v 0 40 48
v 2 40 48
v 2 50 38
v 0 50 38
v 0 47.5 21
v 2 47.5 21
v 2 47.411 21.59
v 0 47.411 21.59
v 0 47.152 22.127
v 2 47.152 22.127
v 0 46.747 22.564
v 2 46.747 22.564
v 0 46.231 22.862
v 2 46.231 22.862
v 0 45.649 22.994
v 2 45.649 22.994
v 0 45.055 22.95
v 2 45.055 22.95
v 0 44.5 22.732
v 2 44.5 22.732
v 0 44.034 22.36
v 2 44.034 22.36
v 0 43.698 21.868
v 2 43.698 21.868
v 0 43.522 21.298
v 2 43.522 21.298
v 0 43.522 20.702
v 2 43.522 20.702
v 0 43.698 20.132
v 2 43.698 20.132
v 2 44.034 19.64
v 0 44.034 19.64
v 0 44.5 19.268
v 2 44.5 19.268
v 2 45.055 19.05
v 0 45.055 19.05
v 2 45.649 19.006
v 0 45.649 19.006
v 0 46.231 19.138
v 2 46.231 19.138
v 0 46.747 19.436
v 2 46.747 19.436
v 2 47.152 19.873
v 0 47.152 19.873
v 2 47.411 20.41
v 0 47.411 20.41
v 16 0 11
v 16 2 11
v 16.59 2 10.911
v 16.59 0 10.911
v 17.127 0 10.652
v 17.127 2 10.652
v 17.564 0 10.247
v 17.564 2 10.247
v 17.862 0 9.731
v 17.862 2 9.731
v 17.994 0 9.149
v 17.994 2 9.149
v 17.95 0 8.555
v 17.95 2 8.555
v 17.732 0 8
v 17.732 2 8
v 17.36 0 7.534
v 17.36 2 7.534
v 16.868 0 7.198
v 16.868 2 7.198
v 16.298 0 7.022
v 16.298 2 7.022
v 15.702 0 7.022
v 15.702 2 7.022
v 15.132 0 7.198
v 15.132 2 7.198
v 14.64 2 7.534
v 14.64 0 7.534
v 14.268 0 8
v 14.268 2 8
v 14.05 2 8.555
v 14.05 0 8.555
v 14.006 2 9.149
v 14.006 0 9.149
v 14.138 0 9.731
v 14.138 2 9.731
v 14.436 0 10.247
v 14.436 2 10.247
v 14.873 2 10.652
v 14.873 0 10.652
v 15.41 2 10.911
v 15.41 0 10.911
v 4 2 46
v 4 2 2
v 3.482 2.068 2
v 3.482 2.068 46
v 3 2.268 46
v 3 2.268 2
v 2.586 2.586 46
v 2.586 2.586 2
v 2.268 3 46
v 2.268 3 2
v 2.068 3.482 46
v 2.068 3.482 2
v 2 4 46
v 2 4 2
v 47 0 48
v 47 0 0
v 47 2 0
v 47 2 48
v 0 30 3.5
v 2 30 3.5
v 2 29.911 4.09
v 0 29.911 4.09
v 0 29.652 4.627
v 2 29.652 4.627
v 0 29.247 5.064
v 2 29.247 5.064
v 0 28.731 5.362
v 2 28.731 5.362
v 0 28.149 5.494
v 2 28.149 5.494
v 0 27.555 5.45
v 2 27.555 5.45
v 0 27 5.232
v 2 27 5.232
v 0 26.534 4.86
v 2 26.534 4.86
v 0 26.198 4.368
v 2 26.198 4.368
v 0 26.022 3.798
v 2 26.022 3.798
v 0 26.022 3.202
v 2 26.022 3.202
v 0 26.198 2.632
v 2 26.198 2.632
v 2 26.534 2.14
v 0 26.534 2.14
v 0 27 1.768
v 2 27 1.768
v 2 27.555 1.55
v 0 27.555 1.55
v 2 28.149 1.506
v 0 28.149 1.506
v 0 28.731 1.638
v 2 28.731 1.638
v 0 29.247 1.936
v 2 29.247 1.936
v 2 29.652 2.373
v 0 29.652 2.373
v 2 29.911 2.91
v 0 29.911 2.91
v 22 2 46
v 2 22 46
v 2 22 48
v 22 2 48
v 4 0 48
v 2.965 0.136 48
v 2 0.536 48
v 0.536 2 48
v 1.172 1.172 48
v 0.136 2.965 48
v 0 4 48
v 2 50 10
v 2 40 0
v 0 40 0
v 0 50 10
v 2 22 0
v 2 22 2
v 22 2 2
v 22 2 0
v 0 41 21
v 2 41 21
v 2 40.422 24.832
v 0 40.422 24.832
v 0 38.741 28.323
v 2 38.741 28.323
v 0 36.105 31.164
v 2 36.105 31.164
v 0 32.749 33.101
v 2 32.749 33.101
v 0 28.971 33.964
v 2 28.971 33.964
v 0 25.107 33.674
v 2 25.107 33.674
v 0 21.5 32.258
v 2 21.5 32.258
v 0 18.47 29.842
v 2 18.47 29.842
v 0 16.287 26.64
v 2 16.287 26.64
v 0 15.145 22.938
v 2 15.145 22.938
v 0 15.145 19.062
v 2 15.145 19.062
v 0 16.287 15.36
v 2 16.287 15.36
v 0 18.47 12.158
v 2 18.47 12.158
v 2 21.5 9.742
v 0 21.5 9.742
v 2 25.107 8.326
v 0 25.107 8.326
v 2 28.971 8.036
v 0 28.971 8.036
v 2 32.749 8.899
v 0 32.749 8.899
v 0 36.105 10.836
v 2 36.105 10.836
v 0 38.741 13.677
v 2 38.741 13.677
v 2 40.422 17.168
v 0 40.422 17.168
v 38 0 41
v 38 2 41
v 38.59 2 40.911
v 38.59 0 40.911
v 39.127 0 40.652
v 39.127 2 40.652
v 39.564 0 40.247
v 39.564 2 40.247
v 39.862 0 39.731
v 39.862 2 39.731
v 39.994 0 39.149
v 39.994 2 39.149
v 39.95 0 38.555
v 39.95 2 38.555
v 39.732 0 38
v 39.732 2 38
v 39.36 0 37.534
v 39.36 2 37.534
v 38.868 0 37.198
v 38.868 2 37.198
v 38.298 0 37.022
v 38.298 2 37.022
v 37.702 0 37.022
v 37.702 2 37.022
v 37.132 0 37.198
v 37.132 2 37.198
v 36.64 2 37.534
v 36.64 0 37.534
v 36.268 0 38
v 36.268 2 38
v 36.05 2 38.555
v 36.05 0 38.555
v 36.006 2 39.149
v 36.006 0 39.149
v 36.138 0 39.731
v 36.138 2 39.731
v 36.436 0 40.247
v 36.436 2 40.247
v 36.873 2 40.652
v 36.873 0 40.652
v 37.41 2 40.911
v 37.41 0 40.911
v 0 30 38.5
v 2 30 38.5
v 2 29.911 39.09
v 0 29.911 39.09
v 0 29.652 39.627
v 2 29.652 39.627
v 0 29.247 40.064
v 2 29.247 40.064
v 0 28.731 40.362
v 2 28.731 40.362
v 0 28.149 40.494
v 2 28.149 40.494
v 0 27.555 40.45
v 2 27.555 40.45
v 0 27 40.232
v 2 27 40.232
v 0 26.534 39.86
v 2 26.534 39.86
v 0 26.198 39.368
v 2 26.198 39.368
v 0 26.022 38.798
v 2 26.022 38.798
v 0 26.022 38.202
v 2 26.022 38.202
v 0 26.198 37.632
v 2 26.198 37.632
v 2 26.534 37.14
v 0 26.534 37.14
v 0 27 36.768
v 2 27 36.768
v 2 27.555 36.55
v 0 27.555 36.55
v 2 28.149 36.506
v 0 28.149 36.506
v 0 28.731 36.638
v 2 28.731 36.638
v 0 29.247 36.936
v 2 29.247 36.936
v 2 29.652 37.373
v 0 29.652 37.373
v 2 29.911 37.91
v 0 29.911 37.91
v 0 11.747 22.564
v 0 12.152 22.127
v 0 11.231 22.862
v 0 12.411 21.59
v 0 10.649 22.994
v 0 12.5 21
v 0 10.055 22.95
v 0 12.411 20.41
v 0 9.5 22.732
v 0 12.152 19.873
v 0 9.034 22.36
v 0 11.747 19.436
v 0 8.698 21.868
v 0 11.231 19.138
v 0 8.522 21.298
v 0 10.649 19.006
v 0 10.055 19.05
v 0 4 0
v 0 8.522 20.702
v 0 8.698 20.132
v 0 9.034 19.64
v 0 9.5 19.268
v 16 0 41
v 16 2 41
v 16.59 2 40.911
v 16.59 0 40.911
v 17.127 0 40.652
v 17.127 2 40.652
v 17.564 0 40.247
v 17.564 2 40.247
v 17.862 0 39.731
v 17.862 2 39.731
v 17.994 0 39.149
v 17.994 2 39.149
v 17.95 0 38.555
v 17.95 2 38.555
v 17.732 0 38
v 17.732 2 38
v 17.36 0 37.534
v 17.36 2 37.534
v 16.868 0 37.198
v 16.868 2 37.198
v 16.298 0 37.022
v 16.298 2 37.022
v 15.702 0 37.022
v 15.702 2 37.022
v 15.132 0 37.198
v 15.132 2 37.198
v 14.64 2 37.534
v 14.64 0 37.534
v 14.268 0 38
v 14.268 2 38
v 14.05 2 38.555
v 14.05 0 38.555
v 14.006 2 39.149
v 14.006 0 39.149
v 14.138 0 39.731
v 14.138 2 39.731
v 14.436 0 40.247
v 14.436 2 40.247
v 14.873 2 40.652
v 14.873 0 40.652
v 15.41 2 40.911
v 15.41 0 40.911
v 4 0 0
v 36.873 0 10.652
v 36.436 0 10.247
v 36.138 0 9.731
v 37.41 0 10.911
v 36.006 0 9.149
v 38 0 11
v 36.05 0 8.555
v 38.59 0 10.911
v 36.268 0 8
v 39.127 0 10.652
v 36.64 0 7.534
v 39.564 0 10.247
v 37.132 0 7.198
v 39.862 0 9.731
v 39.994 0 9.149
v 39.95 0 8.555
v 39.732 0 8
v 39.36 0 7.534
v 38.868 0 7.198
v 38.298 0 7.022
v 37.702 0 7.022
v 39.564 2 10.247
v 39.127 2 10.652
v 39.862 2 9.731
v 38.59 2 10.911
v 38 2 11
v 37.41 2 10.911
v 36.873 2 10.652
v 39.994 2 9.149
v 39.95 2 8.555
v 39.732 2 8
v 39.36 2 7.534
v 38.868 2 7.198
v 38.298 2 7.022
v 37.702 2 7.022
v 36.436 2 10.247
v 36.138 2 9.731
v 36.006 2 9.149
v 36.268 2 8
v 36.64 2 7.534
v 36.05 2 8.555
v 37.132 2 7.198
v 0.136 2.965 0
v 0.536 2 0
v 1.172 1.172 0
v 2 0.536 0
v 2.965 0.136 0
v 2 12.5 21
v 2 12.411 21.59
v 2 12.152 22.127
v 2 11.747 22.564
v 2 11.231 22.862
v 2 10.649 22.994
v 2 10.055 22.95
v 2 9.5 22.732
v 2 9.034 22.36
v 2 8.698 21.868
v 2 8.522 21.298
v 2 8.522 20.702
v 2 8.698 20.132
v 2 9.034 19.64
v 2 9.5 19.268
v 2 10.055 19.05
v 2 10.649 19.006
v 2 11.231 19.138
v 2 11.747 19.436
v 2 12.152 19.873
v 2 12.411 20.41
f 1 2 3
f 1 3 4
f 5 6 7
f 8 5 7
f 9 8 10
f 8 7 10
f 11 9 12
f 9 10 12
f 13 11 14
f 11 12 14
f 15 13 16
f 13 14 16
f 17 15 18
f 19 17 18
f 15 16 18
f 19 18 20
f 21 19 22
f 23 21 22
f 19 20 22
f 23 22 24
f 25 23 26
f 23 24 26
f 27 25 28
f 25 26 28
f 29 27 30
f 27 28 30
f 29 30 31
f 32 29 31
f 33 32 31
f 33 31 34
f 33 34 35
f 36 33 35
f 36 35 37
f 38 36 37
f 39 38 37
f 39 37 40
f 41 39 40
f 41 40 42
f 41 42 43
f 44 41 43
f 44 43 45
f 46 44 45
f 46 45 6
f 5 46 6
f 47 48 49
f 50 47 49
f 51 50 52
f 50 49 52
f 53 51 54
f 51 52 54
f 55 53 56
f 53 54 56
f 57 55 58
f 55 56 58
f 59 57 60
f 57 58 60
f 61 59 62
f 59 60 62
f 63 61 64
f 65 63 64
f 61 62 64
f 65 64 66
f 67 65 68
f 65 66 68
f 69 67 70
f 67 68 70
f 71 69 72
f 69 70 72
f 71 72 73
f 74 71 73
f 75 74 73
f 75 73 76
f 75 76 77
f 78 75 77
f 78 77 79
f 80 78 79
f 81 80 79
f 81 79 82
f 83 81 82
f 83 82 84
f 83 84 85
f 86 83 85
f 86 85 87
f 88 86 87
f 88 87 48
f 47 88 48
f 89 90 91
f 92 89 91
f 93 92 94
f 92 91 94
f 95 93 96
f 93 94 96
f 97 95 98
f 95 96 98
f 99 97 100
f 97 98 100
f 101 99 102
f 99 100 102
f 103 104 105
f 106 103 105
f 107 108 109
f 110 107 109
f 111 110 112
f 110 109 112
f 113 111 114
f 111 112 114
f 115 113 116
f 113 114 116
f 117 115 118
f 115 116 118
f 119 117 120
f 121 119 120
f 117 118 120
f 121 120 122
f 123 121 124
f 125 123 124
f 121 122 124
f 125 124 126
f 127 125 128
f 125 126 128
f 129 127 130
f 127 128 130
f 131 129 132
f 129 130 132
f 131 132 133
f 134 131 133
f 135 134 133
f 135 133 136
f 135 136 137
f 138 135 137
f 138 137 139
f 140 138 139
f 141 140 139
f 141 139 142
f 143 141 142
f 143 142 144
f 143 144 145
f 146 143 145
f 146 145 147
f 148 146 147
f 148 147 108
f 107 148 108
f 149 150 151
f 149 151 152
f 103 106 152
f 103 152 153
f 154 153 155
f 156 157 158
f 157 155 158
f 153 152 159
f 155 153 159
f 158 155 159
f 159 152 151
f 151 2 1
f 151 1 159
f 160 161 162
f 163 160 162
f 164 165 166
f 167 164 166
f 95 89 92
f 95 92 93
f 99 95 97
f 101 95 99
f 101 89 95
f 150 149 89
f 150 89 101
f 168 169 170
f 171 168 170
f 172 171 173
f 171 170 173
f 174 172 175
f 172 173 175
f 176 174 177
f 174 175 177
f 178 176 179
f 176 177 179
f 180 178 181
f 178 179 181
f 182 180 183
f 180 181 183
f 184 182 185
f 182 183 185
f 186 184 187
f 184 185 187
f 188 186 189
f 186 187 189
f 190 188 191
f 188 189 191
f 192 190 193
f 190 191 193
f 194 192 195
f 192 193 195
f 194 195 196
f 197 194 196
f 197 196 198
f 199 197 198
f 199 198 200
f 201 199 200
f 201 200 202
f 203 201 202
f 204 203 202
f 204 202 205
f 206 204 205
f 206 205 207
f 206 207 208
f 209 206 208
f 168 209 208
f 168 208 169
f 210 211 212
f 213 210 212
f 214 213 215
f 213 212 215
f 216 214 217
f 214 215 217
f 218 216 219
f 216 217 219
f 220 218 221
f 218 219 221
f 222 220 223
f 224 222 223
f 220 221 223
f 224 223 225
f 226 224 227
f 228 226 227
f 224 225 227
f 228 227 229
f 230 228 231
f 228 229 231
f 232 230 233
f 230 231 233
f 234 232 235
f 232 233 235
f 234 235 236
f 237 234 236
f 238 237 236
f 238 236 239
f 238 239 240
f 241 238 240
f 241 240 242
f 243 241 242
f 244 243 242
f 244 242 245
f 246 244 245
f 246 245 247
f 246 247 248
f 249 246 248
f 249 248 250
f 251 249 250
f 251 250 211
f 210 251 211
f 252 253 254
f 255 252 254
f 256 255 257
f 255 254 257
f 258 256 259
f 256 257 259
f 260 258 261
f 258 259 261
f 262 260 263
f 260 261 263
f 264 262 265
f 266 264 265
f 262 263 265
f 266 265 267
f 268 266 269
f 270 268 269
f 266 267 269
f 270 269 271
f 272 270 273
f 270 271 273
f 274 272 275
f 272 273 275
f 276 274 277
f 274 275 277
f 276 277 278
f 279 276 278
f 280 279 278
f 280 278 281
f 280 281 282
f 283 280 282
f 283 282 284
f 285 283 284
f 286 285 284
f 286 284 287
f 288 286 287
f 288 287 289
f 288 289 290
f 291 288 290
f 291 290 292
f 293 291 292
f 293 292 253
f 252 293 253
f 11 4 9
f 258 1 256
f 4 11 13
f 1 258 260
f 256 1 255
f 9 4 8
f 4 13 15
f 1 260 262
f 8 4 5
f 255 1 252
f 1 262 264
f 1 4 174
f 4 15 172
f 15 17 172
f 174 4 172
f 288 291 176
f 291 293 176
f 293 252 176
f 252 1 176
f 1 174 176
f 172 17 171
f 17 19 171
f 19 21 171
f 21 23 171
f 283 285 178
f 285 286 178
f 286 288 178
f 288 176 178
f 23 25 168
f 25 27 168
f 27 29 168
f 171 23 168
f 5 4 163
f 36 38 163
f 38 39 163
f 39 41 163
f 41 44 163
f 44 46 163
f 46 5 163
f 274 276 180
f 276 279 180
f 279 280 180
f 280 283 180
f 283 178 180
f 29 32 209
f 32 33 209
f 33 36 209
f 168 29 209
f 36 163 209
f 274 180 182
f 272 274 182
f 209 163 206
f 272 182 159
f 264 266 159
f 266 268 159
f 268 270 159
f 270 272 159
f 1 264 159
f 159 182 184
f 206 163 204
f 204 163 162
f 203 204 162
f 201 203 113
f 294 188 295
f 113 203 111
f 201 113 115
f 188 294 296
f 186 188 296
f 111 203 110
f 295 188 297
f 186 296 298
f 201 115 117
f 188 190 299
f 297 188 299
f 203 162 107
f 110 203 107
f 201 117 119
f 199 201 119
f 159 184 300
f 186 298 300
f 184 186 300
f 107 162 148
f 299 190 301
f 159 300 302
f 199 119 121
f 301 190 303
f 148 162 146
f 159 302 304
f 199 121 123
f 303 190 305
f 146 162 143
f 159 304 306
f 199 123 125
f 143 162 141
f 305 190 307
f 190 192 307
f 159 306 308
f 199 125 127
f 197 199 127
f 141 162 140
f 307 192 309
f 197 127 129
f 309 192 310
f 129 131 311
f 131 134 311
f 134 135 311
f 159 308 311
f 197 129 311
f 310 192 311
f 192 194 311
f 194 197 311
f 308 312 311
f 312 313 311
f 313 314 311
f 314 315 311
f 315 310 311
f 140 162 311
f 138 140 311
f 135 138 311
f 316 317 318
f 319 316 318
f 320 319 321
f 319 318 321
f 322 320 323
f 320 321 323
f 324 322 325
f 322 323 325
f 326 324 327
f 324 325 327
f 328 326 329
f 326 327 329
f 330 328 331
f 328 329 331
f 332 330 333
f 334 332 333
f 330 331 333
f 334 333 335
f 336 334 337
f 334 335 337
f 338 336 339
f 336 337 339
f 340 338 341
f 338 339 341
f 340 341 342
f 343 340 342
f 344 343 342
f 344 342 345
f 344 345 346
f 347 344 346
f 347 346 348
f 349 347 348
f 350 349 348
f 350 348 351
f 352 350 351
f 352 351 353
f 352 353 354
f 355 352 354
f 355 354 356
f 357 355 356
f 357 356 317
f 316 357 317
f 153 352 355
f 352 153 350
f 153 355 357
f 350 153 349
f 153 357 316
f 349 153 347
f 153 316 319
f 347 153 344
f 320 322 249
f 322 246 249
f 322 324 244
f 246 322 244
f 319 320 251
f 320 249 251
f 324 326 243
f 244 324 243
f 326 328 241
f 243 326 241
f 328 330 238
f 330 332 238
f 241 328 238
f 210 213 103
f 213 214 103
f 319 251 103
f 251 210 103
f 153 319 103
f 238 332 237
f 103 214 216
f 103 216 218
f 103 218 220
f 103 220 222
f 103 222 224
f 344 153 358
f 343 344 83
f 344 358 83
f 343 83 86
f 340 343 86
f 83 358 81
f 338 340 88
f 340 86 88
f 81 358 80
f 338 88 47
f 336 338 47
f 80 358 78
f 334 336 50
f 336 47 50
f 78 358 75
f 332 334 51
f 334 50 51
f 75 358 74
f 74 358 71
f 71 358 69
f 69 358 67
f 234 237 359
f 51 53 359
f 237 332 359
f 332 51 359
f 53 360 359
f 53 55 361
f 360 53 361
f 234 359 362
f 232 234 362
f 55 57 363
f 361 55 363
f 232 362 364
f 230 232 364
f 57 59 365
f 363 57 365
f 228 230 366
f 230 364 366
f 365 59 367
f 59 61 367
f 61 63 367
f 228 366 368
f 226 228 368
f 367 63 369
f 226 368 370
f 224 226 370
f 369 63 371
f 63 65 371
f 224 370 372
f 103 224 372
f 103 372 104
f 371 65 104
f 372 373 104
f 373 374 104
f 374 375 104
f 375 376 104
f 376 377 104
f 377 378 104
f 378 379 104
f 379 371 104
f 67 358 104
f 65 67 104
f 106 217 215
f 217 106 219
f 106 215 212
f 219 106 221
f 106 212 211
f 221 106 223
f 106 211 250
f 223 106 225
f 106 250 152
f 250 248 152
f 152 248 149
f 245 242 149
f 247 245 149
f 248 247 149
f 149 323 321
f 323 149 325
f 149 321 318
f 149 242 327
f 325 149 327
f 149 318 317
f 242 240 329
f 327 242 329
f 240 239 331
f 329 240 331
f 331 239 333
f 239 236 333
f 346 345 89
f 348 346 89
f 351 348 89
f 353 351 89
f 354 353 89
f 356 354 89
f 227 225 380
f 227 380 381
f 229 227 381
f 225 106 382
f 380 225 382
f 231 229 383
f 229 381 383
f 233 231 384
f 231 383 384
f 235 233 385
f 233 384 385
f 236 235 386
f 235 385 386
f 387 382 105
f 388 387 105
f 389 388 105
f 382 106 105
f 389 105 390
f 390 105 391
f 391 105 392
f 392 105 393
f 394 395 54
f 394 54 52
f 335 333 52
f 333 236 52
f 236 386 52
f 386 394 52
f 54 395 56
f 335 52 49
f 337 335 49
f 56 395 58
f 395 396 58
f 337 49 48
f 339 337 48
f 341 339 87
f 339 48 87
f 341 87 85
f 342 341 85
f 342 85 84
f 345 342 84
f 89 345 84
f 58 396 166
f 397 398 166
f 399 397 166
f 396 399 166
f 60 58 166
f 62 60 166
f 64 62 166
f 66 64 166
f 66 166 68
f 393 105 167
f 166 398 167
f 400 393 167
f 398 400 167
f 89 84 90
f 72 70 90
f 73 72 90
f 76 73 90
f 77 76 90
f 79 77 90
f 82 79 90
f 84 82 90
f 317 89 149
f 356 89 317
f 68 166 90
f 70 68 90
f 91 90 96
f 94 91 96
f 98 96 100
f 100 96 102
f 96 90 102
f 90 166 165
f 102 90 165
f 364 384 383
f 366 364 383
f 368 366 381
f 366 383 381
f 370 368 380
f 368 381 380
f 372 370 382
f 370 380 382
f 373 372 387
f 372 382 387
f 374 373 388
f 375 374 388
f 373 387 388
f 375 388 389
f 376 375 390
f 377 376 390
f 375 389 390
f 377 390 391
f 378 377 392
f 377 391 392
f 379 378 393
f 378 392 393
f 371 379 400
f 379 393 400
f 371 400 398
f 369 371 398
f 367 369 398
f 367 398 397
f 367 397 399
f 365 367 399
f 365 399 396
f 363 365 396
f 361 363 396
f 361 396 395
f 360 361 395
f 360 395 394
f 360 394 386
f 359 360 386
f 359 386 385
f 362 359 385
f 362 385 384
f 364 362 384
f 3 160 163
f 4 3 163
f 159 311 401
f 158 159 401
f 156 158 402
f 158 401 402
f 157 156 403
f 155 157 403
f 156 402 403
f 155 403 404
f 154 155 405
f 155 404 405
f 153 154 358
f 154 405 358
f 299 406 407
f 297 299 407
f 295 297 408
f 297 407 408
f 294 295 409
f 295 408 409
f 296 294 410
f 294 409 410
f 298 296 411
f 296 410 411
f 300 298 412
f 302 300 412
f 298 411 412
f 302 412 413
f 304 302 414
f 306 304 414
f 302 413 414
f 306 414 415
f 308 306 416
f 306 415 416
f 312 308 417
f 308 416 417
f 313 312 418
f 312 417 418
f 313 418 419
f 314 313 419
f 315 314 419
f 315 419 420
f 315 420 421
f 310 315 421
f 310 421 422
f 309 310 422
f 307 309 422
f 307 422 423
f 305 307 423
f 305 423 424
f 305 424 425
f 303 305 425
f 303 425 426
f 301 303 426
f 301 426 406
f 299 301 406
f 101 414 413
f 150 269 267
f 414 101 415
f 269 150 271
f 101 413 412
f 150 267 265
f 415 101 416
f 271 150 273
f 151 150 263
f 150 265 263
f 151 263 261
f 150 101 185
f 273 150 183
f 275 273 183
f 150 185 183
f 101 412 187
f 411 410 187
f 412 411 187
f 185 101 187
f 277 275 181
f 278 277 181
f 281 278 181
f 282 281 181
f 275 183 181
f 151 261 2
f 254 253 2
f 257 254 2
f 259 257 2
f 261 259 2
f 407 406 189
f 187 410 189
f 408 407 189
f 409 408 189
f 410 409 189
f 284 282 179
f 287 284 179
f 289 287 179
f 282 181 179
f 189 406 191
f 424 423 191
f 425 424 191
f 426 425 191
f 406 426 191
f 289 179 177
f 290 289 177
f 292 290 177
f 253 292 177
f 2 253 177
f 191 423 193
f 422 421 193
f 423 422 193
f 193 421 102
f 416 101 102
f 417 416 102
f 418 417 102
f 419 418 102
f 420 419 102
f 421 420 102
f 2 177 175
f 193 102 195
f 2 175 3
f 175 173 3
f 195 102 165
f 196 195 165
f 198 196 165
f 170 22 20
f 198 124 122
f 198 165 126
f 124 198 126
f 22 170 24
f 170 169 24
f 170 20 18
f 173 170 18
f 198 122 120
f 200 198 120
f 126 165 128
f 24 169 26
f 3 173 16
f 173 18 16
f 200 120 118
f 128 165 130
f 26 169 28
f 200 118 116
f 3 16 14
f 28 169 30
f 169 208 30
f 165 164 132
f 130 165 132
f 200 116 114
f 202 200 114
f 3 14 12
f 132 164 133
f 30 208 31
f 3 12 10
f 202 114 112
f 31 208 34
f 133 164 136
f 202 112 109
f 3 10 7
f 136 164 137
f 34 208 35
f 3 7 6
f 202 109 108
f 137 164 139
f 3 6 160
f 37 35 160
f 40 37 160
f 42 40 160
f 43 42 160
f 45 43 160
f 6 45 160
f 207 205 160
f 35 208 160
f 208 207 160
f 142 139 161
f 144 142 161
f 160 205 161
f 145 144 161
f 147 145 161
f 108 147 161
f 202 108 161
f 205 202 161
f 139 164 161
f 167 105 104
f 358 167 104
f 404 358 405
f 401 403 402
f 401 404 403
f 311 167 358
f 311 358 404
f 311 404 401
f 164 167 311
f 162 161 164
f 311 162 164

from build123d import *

# Parameters (mm, degrees)
SM_BASE_FLANGE_1_DEPTH = 48
SKETCH_6_R             = 2
CUT_EXTRUDE_1_DEPTH    = 10
SKETCH_7_R             = 13
SKETCH_7_R_2           = 2
CUT_EXTRUDE_2_DEPTH    = 10
CHAMFER_1_SIZE         = 10
EXTRUDE_START          = -2
EXTRUDE_1_DEPTH        = 2


# Sheet-metal steps are written as plain solids
with BuildPart() as part:
    # Sketch 1 → 基体-法兰1 (new body)
    with BuildSketch(Plane.XY):
        with BuildLine():
            Line((0, 50), (0, 4))
            ThreePointArc((0, 4), (1.171572875, 1.171572875), (4, 0))
            Line((4, 0), (47, 0))
            Line((47, 0), (47, 2))
            Line((47, 2), (4, 2))
            ThreePointArc((4, 2), (2.585786438, 2.585786438), (2, 4))
            Line((2, 4), (2, 50))
            Line((2, 50), (0, 50))
        make_face()
    extrude(amount=SM_BASE_FLANGE_1_DEPTH)

    # 草图6 → 切除-拉伸1 (cut)
    with BuildSketch(Plane(origin=(0, 2, 0), x_dir=(1, 0, 0), z_dir=(0, 1, 0))):
        with Locations(Location((38, -9, 0), (0, 0, 270))):
            Circle(SKETCH_6_R)
        with Locations(Location((38, -39, 0), (0, 0, 270))):
            Circle(SKETCH_6_R)
        with Locations(Location((16, -9, 0), (0, 0, 270))):
            Circle(SKETCH_6_R)
        with Locations(Location((16, -39, 0), (0, 0, 270))):
            Circle(SKETCH_6_R)
    extrude(amount=-CUT_EXTRUDE_1_DEPTH, mode=Mode.SUBTRACT)

    # 草图7 → 切除-拉伸2 (cut)
    with BuildSketch(Plane(origin=(2, 0, 0), x_dir=(0, 0, -1), z_dir=(1, 0, 0))):
        with Locations(Location((-21, 28, 0), (0, 0, 90))):
            Circle(SKETCH_7_R)
        with Locations(Location((-21, 45.5, 0), (0, 0, 90))):
            Circle(SKETCH_7_R_2)
        with Locations(Location((-3.5, 28, 0), (0, 0, 90))):
            Circle(SKETCH_7_R_2)
        with Locations(Location((-21, 10.5, 0), (0, 0, 90))):
            Circle(SKETCH_7_R_2)
        with Locations(Location((-38.5, 28, 0), (0, 0, 90))):
            Circle(SKETCH_7_R_2)
    extrude(amount=-CUT_EXTRUDE_2_DEPTH, mode=Mode.SUBTRACT)

    # 倒角1
    chamfer_1_edges = [part.edges().sort_by_distance(p)[0] for p in [
        (1, 50, 48),
        (1, 50, 0),
    ]]
    chamfer(chamfer_1_edges, length=CHAMFER_1_SIZE)

    # 草图8 → 凸台-拉伸1 (add)
    with BuildSketch(Plane.XY.offset(48).offset(EXTRUDE_START)):
        with BuildLine():
            Line((2, 22), (22, 2))
            Line((22, 2), (4, 2))
            ThreePointArc((4, 2), (2.585786438, 2.585786438), (2, 4))
            Line((2, 4), (2, 22))
        make_face()
    extrude_1 = extrude(amount=EXTRUDE_1_DEPTH)

    # 镜向1: 凸台-拉伸1 across plane
    add(extrude_1.mirror(Plane.XY.offset(24)))


solid = part.part
